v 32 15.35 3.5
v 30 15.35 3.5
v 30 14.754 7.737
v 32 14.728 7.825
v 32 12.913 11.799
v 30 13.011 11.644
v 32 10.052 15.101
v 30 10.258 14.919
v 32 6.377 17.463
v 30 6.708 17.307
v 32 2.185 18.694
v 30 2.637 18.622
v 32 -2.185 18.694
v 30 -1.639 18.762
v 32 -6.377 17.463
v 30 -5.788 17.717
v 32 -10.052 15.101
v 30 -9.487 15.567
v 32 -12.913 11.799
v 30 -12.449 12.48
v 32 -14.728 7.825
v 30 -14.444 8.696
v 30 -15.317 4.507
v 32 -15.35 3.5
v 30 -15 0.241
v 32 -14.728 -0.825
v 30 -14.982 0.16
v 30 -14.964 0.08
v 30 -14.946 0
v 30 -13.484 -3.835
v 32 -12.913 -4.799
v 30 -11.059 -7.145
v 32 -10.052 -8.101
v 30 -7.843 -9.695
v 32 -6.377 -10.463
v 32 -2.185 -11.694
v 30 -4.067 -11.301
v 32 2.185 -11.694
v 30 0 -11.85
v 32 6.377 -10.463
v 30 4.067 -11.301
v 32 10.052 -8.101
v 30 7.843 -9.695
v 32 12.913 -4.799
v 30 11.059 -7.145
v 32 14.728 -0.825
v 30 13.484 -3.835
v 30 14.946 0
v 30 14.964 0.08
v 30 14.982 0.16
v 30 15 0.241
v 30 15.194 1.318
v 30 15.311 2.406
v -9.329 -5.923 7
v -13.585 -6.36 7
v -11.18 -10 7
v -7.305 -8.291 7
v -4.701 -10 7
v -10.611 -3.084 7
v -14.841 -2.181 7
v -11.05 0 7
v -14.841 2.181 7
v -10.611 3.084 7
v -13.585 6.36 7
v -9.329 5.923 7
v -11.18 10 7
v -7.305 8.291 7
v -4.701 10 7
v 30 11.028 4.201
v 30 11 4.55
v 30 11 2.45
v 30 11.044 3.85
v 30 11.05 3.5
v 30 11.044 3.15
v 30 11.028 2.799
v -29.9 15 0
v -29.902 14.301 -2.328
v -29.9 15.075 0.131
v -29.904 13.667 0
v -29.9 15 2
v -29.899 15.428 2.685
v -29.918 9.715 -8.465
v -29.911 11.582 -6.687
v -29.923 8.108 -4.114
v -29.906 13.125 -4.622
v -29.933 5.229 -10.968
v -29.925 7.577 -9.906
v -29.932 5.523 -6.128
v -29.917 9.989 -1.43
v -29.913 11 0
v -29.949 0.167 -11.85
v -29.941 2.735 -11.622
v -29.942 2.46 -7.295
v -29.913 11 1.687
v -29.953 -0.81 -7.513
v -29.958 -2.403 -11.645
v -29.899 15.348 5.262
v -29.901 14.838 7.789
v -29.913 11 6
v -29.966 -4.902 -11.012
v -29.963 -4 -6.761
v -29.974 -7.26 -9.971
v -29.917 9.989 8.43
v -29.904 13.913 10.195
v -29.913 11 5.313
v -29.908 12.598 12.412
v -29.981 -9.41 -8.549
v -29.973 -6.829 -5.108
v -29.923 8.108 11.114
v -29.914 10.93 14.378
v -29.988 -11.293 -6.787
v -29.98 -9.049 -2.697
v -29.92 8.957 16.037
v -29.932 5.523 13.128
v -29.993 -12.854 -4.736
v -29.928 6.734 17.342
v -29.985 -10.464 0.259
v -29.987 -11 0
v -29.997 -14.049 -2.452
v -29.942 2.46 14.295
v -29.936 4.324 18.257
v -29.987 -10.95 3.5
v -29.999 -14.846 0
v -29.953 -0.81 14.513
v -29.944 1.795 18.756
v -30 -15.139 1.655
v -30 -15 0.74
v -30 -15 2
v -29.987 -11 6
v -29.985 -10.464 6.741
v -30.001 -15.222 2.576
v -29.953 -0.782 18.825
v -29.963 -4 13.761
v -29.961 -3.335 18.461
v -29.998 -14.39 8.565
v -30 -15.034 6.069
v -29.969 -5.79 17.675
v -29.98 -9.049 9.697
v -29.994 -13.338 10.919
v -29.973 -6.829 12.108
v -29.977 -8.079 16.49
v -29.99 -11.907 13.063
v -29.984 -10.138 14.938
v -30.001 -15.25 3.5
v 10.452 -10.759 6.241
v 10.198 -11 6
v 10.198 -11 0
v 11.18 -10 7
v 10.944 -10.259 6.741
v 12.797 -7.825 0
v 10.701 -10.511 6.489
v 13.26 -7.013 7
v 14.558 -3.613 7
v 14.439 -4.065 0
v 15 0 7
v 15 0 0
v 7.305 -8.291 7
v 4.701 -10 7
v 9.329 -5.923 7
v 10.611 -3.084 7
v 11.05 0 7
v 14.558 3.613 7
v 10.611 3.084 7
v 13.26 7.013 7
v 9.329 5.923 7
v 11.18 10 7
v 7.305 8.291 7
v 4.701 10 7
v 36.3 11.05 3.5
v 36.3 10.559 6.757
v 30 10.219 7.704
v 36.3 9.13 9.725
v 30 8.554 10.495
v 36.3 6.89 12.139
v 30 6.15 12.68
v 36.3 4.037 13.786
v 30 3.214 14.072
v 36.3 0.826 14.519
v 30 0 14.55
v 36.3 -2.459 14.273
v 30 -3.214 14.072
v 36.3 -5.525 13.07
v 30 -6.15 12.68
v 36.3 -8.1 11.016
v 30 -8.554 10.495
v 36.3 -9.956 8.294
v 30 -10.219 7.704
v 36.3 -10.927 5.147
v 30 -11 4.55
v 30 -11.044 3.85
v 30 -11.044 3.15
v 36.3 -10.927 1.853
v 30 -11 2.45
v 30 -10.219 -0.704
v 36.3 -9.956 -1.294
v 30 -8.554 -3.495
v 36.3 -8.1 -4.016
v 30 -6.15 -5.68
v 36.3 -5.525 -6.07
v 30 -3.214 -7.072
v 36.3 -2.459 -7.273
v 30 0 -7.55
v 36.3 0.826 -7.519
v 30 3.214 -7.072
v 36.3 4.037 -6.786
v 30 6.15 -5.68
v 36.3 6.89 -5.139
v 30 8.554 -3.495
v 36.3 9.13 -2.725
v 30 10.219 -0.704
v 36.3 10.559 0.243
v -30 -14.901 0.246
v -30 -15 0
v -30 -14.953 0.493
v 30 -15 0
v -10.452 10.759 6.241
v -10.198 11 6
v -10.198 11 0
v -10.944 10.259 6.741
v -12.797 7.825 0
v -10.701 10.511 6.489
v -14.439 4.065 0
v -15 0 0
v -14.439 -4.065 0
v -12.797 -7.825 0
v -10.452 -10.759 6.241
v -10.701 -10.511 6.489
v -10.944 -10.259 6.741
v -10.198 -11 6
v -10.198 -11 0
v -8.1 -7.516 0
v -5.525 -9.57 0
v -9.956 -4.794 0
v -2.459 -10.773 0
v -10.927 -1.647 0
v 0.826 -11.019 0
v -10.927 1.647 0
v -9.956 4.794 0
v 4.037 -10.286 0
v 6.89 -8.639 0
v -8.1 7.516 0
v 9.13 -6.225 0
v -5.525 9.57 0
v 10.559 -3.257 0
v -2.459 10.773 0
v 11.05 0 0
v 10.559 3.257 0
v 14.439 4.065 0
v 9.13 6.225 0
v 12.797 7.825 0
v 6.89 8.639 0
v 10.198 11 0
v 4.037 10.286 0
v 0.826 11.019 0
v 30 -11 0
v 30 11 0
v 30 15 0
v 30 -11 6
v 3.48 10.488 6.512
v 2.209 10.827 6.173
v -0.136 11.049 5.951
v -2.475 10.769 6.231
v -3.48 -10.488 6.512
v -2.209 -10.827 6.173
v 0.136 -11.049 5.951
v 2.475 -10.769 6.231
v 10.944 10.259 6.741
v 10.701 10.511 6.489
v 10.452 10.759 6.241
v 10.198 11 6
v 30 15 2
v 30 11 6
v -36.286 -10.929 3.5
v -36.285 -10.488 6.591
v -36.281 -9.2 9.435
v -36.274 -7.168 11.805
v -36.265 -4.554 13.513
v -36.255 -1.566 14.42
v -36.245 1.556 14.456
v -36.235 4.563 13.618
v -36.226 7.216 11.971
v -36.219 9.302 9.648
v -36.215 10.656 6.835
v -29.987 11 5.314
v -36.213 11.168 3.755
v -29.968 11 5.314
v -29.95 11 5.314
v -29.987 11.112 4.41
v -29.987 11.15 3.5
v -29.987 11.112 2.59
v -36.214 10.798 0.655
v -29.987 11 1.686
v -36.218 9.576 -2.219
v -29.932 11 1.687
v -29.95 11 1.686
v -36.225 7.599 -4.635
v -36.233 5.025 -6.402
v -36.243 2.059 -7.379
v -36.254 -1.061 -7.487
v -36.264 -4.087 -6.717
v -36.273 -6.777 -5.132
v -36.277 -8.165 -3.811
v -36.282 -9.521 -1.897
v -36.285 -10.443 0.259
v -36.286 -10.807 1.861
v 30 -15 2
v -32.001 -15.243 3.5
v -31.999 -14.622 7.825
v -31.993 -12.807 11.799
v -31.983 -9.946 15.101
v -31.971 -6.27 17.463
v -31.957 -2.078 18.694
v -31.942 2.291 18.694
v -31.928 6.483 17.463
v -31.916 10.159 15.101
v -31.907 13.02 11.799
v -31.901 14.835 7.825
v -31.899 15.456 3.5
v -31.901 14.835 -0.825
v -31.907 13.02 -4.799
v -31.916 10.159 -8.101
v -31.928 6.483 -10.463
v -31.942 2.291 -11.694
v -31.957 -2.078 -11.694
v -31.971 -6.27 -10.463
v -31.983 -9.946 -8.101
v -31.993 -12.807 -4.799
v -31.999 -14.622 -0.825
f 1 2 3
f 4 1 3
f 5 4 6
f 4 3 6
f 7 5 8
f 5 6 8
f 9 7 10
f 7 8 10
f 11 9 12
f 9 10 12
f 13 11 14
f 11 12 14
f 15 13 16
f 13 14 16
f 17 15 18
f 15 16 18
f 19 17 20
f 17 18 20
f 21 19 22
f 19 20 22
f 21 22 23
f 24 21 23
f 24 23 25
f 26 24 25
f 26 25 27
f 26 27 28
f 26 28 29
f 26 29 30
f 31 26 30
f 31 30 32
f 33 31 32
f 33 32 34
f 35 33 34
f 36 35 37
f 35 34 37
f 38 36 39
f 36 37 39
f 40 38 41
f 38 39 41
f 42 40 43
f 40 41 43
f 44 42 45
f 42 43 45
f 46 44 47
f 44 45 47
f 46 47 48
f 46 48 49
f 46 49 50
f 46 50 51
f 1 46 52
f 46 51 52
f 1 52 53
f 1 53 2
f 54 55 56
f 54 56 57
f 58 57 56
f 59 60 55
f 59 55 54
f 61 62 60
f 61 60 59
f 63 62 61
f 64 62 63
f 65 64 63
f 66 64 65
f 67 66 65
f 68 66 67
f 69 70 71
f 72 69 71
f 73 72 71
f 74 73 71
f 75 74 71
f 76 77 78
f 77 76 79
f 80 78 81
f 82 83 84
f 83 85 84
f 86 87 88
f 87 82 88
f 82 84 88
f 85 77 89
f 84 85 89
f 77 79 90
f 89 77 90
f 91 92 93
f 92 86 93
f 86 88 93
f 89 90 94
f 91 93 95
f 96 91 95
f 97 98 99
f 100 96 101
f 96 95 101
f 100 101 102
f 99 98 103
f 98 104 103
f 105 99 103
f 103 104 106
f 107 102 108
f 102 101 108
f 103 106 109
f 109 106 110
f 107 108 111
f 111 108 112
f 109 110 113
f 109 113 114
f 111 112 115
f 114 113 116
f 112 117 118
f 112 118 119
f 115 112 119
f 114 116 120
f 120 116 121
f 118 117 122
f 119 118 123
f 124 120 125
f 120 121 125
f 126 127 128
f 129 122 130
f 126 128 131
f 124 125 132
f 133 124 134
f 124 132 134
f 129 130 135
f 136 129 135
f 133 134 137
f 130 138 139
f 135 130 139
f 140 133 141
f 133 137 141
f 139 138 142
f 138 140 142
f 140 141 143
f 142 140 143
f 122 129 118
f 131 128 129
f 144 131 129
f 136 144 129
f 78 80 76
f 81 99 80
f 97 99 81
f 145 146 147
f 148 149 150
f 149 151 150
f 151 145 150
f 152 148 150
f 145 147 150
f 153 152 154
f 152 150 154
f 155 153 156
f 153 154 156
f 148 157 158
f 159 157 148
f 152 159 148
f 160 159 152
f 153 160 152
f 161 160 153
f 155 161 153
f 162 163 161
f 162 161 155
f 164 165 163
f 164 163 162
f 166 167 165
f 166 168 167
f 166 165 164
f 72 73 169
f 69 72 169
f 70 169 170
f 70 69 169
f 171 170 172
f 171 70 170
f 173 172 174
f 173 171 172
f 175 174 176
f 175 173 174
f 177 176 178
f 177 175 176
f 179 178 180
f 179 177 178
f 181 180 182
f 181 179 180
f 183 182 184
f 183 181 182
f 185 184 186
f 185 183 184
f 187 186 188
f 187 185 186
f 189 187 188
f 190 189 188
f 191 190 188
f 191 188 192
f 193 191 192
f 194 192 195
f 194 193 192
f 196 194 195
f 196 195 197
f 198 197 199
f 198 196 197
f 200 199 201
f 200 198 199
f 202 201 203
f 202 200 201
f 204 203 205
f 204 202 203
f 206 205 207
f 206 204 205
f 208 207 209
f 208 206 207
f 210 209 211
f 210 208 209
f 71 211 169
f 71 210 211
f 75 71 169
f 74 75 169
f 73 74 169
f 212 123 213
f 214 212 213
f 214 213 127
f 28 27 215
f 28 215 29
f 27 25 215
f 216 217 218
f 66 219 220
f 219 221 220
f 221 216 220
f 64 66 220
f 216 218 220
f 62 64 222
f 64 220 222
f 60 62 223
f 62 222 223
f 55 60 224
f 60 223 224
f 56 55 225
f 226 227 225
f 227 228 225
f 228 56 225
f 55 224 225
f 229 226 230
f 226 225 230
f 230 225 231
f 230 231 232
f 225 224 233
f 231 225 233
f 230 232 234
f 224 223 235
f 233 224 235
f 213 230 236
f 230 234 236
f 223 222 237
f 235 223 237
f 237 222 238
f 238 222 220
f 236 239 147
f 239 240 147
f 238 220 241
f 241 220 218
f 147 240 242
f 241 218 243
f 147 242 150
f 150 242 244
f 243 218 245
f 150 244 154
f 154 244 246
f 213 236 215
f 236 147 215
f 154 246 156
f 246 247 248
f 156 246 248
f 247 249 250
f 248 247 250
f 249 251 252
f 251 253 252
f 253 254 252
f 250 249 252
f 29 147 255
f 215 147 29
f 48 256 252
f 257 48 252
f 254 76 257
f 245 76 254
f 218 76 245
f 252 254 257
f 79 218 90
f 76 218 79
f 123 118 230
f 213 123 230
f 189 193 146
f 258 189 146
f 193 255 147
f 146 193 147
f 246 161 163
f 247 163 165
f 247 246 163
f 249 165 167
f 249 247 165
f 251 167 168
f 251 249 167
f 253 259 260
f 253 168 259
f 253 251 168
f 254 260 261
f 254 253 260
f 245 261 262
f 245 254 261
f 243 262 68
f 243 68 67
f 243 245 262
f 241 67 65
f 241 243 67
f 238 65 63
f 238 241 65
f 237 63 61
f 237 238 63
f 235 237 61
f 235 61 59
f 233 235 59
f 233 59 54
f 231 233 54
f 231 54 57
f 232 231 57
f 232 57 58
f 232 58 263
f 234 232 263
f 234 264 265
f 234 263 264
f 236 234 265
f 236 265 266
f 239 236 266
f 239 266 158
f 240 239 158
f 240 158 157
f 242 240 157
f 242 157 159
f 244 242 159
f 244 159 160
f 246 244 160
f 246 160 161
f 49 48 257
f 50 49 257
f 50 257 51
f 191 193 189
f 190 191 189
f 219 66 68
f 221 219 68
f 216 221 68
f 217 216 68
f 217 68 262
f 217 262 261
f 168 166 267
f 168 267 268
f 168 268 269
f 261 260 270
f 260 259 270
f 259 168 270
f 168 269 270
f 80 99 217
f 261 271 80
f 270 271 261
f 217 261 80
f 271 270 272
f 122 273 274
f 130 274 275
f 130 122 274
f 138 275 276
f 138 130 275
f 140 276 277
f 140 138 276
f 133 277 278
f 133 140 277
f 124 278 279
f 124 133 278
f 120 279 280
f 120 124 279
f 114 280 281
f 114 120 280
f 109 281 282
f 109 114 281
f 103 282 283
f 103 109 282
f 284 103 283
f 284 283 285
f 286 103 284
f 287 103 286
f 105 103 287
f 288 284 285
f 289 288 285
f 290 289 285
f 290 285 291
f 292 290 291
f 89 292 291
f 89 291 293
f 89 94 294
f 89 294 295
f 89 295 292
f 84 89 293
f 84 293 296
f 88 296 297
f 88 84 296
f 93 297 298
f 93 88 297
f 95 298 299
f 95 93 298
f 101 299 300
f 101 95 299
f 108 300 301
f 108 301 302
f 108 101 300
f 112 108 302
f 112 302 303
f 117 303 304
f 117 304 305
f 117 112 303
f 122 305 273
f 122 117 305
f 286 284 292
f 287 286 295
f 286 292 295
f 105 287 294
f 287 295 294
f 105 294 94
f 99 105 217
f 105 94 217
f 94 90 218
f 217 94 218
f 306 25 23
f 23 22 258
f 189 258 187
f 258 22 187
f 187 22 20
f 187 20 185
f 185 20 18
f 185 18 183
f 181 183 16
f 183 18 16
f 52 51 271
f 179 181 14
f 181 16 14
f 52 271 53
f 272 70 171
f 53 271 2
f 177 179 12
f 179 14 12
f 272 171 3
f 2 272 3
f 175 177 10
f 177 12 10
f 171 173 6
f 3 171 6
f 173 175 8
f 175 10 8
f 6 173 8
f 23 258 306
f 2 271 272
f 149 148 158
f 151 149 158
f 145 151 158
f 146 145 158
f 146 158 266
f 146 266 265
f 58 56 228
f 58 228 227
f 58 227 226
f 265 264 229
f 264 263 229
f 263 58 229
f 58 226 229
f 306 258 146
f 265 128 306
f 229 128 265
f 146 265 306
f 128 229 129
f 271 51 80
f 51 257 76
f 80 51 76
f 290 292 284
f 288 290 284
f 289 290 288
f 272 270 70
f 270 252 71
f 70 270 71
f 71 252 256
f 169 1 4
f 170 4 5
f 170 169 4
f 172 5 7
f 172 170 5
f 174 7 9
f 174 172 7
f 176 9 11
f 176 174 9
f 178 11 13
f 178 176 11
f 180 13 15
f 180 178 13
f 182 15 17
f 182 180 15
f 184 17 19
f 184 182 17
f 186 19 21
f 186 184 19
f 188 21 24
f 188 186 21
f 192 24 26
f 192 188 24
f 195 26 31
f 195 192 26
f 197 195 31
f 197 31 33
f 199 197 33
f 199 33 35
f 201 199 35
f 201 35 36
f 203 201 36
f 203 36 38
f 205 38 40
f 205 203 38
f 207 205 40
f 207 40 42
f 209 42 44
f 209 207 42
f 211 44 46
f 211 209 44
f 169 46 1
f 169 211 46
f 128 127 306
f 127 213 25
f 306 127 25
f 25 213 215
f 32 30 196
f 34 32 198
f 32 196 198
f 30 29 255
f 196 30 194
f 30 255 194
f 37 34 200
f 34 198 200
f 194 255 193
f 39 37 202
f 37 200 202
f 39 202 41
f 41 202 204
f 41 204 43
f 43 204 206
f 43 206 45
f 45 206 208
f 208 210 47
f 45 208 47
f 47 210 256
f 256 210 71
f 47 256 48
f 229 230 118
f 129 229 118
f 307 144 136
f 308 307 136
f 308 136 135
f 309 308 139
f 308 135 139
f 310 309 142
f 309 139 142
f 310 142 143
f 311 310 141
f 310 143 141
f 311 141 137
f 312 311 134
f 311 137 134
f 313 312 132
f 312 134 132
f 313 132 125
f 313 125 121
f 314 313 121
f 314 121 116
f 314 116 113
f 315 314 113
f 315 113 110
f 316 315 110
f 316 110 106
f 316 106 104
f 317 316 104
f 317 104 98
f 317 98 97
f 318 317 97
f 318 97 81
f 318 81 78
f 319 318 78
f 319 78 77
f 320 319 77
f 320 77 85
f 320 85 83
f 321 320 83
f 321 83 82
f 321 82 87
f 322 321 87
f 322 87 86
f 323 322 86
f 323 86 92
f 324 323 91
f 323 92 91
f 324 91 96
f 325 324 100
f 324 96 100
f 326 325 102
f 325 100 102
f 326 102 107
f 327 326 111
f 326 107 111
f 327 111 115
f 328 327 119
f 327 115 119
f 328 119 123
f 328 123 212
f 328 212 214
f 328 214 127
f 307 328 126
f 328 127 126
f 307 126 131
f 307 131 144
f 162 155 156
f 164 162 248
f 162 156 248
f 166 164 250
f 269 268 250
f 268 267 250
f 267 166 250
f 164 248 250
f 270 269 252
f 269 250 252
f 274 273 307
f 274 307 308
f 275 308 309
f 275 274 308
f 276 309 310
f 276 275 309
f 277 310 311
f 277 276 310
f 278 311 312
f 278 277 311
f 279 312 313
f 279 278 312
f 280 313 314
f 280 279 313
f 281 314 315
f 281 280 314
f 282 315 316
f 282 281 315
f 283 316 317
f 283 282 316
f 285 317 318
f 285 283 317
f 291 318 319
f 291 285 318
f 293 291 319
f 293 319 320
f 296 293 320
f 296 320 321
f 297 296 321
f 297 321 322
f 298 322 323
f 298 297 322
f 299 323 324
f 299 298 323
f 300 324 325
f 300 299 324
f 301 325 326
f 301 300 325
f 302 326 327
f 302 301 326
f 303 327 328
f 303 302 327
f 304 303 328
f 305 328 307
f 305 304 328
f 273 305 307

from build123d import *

# Parameters (mm, degrees)
F0_R        = 11.05
F1_DEPTH    = 7
F2_R        = 15.35
F2_R_2      = 11.05
F3_DEPTH    = 7
F4_R        = 15.35
F4_R_2      = 11.05
F5_DEPTH    = 7
F6_T4_DEPTH = 72.7584417561
F6_T9_DEPTH = 72.8584149398


# Not quite as in the source:
# - a fillet or chamfer that OpenCascade refuses, or shapes differently, is made with other operations: its cross-section is extruded or revolved along the edge and cut away or added


with BuildPart() as f1:
    # F0 (on Top) → F1 (new body)
    with BuildSketch(Plane.XY):
        with BuildLine():
            ThreePointArc((10.1980390272, -11), (13.7471921753, -6.0012254829), (15, 0))
            ThreePointArc((15, 0), (13.7471921753, 6.0012254829), (10.1980390272, 11))
            ThreePointArc((10.1980390272, 11), (5.4772255751, 13.9642400438), (0, 15))
            ThreePointArc((0, 15), (-5.4772255751, 13.9642400438), (-10.1980390272, 11))
            ThreePointArc((-10.1980390272, 11), (-15, 0), (-10.1980390272, -11))
            ThreePointArc((-10.1980390272, -11), (-5.4772255751, -13.9642400438), (0, -15))
            ThreePointArc((0, -15), (5.4772255751, -13.9642400438), (10.1980390272, -11))
        make_face()
        Circle(F0_R, mode=Mode.SUBTRACT)
        with BuildLine():
            ThreePointArc((0, 15), (5.4772255751, 13.9642400438), (10.1980390272, 11))
            Line((10.1980390272, 11), (30, 11))
            Line((30, 11), (30, 15))
            Line((30, 15), (0, 15))
        make_face()
        with BuildLine():
            Line((30, -11), (10.1980390272, -11))
            ThreePointArc((10.1980390272, -11), (5.4772255751, -13.9642400438), (0, -15))
            Line((0, -15), (30, -15))
            Line((30, -15), (30, -11))
        make_face()
        with BuildLine():
            ThreePointArc((-10.1980390272, 11), (-5.4772255751, 13.9642400438), (0, 15))
            Line((0, 15), (-30, 15))
            Line((-30, 15), (-29.9866729691, 11))
            Line((-29.9866729691, 11), (-10.1980390272, 11))
        make_face()
        with BuildLine():
            Line((-30, -15), (0, -15))
            ThreePointArc((0, -15), (-5.4772255751, -13.9642400438), (-10.1980390272, -11))
            Line((-10.1980390272, -11), (-29.9866702422, -11))
            Line((-29.9866702422, -11), (-30, -15))
        make_face()
    extrude(amount=F1_DEPTH)

    # F2 (on face) → F3 (join)
    with BuildSketch(Plane(origin=(-29.9496808123, 0.0998054981, 0), x_dir=(-0.003332421, -0.9999944475, 0), z_dir=(-0.9999944475, 0.003332421, 0))):
        with Locations((0, 3.5)):
            Circle(F2_R)
        with Locations((0, 3.5)):
            Circle(F2_R_2, mode=Mode.SUBTRACT)
    extrude(amount=F3_DEPTH)

    # F4 (on face) → F5 (join)
    with BuildSketch(Plane.YZ.offset(30)):
        with Locations((0, 3.5)):
            Circle(F4_R)
        with Locations((0, 3.5)):
            Circle(F4_R_2, mode=Mode.SUBTRACT)
    extrude(amount=F5_DEPTH)

    # F6: chamfer of 5 on 4 edges, made by hand


with BuildPart() as f6_tool2:
    # F6_s3 → F6_t4 (new body)
    with BuildSketch(Plane.YZ.offset(30)):
        Polygon((10, 7), (15, 2), (15, 7), align=None)
    extrude(amount=-F6_T4_DEPTH)

    split(bisect_by=Plane(origin=(-29.9496808123, 0.0998054981, 0), x_dir=(0, 0, 1), z_dir=(0.9999944475, -0.003332421, 0)), keep=Keep.TOP)


with BuildPart() as f1_1:
    add(f1.part)

    # F6_t1: cut F6_tool2
    add(f6_tool2.part, mode=Mode.SUBTRACT)


with BuildPart() as f6_tool7:
    # F6_s8 → F6_t9 (new body)
    with BuildSketch(Plane.YZ.offset(-42.8584149398)):
        Polygon((-10, 7), (-15, 2), (-15, 7), align=None)
    extrude(amount=F6_T9_DEPTH)

    split(bisect_by=Plane(origin=(-29.9496808123, 0.0998054981, 0), x_dir=(0, 0, 1), z_dir=(0.9999944475, -0.003332421, 0)), keep=Keep.TOP)


with BuildPart() as f1_2:
    add(f1_1.part)

    # F6_t6: cut F6_tool7
    add(f6_tool7.part, mode=Mode.SUBTRACT)

    # F6_s11 → F6_t12 (revolve, cut)
    with BuildSketch(Plane.XY.offset(3.5)):
        Polygon((32, 15.35), (37, 10.35), (37, 15.35), align=None)
    revolve(axis=Axis((37, 0, 3.5), (1, 0, 0)), mode=Mode.SUBTRACT)

    # F6_s13 → F6_t14 (revolve, cut)
    with BuildSketch(Plane.XY.offset(3.5)):
        Polygon((-32.0008223689, -15.2434444286), (-36.9841325015, -10.2268100865), (-37.0007946063, -15.2267823238), align=None)
    revolve(axis=Axis((-36.9496419446, 0.1231324448, 3.5), (-0.9999944475, 0.003332421, 0)), mode=Mode.SUBTRACT)


solid = f1_2.part
